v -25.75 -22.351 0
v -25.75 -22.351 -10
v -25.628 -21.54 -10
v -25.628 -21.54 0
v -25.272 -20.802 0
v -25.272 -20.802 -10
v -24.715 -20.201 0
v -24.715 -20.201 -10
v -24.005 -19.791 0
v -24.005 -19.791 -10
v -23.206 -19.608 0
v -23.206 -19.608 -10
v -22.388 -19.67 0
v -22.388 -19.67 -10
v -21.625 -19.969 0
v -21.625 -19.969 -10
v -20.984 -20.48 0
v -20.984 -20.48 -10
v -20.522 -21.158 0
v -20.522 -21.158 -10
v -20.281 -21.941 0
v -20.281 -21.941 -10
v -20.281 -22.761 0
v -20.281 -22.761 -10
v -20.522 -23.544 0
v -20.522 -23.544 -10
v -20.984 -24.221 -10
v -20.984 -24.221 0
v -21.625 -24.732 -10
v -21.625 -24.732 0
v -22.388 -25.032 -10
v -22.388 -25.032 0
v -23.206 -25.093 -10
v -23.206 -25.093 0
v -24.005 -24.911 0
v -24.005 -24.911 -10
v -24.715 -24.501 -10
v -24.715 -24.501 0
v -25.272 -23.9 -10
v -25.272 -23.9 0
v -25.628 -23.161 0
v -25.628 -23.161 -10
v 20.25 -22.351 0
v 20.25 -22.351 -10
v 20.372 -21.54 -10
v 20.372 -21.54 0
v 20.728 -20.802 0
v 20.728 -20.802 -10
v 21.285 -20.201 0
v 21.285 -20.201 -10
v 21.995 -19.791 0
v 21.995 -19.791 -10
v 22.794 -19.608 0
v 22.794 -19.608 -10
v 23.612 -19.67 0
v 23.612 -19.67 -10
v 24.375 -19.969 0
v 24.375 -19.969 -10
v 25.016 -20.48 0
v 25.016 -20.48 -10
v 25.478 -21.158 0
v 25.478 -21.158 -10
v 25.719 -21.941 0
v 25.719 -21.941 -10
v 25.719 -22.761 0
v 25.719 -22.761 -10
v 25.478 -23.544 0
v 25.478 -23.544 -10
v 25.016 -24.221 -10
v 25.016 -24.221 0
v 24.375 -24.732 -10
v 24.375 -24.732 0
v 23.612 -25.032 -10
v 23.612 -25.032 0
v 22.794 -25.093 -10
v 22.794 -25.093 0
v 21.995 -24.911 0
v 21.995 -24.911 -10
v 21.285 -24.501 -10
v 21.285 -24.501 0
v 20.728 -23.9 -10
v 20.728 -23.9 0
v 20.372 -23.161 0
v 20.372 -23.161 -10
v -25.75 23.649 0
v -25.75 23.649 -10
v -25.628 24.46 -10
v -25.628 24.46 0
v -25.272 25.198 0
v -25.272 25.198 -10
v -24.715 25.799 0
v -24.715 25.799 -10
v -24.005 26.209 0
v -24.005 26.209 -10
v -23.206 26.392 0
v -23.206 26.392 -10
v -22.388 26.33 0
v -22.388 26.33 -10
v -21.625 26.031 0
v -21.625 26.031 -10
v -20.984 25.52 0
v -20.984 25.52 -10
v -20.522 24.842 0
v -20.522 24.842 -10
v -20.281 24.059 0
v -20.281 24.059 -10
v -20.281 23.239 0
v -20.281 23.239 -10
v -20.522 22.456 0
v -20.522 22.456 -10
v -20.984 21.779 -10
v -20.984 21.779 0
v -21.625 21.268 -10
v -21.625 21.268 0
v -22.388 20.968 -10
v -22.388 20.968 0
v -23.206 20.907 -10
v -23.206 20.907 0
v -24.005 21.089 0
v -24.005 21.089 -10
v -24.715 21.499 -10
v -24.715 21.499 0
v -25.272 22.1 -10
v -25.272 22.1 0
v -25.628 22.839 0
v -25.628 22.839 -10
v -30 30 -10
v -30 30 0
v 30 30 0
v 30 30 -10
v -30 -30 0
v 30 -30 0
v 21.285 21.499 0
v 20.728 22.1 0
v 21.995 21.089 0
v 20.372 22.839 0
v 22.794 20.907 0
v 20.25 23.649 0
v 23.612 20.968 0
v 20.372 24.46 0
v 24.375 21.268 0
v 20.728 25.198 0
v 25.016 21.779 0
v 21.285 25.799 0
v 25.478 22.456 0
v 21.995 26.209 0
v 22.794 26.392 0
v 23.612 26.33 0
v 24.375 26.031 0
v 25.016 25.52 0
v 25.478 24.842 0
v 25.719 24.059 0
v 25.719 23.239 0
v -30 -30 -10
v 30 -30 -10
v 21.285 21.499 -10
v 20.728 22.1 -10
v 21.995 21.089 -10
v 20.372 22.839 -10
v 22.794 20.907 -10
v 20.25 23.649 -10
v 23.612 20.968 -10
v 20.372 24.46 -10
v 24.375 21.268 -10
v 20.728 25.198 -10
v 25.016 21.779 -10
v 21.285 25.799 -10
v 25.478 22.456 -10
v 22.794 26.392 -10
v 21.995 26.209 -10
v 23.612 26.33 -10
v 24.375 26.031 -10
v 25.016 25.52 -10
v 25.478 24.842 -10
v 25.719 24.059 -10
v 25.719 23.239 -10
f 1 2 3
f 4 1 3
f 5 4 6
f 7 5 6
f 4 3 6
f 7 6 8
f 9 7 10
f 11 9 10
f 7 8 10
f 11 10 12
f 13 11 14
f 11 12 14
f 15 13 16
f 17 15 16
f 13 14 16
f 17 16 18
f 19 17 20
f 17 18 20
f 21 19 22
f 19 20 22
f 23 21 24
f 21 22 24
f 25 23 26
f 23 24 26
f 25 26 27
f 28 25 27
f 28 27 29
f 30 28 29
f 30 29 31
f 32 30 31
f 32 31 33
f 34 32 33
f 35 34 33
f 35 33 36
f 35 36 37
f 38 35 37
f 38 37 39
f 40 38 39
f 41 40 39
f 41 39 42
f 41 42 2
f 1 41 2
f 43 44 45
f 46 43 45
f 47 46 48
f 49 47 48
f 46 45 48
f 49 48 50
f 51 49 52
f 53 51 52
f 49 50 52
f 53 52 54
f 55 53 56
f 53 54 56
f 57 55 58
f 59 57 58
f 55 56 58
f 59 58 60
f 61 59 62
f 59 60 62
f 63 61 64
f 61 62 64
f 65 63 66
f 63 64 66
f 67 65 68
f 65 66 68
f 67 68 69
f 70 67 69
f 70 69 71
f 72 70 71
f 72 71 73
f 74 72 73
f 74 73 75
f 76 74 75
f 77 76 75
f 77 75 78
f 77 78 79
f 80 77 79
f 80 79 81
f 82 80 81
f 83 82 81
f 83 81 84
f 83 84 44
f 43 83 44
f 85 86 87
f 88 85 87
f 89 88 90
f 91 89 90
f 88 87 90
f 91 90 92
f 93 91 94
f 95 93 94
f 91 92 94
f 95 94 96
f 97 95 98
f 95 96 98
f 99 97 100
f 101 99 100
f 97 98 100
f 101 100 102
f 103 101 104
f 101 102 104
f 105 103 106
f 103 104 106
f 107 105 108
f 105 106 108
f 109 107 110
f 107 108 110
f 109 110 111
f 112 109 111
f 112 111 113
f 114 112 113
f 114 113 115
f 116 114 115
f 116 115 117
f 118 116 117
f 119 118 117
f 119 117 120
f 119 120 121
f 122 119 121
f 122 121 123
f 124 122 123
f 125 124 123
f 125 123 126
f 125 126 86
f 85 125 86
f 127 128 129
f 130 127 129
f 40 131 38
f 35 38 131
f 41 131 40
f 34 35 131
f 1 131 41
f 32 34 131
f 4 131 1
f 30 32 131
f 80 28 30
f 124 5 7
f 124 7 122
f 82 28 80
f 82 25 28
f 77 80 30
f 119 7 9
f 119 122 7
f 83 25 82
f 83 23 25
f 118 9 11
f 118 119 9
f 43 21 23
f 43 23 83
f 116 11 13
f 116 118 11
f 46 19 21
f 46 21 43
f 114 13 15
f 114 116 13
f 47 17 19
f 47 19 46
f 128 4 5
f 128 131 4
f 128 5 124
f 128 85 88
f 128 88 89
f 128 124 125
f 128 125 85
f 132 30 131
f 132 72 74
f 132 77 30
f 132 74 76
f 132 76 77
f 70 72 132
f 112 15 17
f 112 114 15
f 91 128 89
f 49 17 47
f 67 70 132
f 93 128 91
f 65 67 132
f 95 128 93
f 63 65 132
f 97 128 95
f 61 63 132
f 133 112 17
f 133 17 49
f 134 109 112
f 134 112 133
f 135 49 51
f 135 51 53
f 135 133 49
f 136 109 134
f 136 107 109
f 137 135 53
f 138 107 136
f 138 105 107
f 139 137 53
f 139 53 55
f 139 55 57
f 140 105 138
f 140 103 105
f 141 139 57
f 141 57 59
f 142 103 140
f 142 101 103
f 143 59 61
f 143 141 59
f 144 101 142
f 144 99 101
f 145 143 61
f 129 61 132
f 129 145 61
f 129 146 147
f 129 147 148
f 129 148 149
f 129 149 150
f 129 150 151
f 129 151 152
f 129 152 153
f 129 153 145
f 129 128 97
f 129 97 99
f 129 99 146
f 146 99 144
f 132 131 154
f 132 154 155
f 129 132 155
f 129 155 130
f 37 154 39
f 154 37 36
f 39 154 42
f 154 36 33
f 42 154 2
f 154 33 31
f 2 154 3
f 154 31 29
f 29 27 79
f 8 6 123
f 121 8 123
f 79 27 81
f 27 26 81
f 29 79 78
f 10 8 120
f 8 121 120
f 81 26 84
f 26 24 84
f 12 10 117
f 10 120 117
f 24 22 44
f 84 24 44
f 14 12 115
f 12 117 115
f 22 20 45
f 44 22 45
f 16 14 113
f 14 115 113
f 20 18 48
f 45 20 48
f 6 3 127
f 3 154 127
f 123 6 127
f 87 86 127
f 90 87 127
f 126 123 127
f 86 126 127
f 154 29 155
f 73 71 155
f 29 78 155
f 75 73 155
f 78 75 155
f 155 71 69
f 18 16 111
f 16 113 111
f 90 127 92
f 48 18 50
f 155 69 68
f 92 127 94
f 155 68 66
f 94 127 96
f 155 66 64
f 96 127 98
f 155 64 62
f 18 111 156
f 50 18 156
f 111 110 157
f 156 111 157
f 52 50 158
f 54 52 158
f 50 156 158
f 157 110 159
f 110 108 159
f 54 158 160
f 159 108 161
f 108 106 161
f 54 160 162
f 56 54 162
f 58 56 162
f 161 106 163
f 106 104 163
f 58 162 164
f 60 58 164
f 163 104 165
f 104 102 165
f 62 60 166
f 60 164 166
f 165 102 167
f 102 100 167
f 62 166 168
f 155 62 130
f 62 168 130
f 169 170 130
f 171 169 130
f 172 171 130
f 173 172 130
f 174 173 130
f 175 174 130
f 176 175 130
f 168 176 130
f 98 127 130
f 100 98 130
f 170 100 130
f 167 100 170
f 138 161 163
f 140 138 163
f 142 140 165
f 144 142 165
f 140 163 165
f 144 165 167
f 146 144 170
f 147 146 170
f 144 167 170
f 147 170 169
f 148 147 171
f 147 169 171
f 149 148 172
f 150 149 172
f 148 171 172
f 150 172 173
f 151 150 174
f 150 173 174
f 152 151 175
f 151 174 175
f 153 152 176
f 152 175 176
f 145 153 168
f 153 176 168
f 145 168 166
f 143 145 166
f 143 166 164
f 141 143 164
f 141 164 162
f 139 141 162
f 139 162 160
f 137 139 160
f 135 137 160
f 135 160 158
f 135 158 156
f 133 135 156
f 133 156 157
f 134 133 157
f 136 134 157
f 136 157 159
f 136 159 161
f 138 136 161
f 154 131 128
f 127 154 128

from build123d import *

# Parameters (mm, degrees)
F0_W     = 60
F0_H     = 60
F1_DEPTH = 10
F3_D     = 5.5


with BuildPart() as f1:
    # F0 (on Top) → F1 (new body)
    with BuildSketch(Plane.XY):
        Rectangle(F0_W, F0_H)
    extrude(amount=-F1_DEPTH)

    # F3 (through all)
    with Locations(Plane.XY):
        with Locations((23, -22.3507442691), (-23, -22.3507442691), (-23, 23.6492557309), (23, 23.6492557309)):
            Hole(F3_D / 2)


solid = f1.part
